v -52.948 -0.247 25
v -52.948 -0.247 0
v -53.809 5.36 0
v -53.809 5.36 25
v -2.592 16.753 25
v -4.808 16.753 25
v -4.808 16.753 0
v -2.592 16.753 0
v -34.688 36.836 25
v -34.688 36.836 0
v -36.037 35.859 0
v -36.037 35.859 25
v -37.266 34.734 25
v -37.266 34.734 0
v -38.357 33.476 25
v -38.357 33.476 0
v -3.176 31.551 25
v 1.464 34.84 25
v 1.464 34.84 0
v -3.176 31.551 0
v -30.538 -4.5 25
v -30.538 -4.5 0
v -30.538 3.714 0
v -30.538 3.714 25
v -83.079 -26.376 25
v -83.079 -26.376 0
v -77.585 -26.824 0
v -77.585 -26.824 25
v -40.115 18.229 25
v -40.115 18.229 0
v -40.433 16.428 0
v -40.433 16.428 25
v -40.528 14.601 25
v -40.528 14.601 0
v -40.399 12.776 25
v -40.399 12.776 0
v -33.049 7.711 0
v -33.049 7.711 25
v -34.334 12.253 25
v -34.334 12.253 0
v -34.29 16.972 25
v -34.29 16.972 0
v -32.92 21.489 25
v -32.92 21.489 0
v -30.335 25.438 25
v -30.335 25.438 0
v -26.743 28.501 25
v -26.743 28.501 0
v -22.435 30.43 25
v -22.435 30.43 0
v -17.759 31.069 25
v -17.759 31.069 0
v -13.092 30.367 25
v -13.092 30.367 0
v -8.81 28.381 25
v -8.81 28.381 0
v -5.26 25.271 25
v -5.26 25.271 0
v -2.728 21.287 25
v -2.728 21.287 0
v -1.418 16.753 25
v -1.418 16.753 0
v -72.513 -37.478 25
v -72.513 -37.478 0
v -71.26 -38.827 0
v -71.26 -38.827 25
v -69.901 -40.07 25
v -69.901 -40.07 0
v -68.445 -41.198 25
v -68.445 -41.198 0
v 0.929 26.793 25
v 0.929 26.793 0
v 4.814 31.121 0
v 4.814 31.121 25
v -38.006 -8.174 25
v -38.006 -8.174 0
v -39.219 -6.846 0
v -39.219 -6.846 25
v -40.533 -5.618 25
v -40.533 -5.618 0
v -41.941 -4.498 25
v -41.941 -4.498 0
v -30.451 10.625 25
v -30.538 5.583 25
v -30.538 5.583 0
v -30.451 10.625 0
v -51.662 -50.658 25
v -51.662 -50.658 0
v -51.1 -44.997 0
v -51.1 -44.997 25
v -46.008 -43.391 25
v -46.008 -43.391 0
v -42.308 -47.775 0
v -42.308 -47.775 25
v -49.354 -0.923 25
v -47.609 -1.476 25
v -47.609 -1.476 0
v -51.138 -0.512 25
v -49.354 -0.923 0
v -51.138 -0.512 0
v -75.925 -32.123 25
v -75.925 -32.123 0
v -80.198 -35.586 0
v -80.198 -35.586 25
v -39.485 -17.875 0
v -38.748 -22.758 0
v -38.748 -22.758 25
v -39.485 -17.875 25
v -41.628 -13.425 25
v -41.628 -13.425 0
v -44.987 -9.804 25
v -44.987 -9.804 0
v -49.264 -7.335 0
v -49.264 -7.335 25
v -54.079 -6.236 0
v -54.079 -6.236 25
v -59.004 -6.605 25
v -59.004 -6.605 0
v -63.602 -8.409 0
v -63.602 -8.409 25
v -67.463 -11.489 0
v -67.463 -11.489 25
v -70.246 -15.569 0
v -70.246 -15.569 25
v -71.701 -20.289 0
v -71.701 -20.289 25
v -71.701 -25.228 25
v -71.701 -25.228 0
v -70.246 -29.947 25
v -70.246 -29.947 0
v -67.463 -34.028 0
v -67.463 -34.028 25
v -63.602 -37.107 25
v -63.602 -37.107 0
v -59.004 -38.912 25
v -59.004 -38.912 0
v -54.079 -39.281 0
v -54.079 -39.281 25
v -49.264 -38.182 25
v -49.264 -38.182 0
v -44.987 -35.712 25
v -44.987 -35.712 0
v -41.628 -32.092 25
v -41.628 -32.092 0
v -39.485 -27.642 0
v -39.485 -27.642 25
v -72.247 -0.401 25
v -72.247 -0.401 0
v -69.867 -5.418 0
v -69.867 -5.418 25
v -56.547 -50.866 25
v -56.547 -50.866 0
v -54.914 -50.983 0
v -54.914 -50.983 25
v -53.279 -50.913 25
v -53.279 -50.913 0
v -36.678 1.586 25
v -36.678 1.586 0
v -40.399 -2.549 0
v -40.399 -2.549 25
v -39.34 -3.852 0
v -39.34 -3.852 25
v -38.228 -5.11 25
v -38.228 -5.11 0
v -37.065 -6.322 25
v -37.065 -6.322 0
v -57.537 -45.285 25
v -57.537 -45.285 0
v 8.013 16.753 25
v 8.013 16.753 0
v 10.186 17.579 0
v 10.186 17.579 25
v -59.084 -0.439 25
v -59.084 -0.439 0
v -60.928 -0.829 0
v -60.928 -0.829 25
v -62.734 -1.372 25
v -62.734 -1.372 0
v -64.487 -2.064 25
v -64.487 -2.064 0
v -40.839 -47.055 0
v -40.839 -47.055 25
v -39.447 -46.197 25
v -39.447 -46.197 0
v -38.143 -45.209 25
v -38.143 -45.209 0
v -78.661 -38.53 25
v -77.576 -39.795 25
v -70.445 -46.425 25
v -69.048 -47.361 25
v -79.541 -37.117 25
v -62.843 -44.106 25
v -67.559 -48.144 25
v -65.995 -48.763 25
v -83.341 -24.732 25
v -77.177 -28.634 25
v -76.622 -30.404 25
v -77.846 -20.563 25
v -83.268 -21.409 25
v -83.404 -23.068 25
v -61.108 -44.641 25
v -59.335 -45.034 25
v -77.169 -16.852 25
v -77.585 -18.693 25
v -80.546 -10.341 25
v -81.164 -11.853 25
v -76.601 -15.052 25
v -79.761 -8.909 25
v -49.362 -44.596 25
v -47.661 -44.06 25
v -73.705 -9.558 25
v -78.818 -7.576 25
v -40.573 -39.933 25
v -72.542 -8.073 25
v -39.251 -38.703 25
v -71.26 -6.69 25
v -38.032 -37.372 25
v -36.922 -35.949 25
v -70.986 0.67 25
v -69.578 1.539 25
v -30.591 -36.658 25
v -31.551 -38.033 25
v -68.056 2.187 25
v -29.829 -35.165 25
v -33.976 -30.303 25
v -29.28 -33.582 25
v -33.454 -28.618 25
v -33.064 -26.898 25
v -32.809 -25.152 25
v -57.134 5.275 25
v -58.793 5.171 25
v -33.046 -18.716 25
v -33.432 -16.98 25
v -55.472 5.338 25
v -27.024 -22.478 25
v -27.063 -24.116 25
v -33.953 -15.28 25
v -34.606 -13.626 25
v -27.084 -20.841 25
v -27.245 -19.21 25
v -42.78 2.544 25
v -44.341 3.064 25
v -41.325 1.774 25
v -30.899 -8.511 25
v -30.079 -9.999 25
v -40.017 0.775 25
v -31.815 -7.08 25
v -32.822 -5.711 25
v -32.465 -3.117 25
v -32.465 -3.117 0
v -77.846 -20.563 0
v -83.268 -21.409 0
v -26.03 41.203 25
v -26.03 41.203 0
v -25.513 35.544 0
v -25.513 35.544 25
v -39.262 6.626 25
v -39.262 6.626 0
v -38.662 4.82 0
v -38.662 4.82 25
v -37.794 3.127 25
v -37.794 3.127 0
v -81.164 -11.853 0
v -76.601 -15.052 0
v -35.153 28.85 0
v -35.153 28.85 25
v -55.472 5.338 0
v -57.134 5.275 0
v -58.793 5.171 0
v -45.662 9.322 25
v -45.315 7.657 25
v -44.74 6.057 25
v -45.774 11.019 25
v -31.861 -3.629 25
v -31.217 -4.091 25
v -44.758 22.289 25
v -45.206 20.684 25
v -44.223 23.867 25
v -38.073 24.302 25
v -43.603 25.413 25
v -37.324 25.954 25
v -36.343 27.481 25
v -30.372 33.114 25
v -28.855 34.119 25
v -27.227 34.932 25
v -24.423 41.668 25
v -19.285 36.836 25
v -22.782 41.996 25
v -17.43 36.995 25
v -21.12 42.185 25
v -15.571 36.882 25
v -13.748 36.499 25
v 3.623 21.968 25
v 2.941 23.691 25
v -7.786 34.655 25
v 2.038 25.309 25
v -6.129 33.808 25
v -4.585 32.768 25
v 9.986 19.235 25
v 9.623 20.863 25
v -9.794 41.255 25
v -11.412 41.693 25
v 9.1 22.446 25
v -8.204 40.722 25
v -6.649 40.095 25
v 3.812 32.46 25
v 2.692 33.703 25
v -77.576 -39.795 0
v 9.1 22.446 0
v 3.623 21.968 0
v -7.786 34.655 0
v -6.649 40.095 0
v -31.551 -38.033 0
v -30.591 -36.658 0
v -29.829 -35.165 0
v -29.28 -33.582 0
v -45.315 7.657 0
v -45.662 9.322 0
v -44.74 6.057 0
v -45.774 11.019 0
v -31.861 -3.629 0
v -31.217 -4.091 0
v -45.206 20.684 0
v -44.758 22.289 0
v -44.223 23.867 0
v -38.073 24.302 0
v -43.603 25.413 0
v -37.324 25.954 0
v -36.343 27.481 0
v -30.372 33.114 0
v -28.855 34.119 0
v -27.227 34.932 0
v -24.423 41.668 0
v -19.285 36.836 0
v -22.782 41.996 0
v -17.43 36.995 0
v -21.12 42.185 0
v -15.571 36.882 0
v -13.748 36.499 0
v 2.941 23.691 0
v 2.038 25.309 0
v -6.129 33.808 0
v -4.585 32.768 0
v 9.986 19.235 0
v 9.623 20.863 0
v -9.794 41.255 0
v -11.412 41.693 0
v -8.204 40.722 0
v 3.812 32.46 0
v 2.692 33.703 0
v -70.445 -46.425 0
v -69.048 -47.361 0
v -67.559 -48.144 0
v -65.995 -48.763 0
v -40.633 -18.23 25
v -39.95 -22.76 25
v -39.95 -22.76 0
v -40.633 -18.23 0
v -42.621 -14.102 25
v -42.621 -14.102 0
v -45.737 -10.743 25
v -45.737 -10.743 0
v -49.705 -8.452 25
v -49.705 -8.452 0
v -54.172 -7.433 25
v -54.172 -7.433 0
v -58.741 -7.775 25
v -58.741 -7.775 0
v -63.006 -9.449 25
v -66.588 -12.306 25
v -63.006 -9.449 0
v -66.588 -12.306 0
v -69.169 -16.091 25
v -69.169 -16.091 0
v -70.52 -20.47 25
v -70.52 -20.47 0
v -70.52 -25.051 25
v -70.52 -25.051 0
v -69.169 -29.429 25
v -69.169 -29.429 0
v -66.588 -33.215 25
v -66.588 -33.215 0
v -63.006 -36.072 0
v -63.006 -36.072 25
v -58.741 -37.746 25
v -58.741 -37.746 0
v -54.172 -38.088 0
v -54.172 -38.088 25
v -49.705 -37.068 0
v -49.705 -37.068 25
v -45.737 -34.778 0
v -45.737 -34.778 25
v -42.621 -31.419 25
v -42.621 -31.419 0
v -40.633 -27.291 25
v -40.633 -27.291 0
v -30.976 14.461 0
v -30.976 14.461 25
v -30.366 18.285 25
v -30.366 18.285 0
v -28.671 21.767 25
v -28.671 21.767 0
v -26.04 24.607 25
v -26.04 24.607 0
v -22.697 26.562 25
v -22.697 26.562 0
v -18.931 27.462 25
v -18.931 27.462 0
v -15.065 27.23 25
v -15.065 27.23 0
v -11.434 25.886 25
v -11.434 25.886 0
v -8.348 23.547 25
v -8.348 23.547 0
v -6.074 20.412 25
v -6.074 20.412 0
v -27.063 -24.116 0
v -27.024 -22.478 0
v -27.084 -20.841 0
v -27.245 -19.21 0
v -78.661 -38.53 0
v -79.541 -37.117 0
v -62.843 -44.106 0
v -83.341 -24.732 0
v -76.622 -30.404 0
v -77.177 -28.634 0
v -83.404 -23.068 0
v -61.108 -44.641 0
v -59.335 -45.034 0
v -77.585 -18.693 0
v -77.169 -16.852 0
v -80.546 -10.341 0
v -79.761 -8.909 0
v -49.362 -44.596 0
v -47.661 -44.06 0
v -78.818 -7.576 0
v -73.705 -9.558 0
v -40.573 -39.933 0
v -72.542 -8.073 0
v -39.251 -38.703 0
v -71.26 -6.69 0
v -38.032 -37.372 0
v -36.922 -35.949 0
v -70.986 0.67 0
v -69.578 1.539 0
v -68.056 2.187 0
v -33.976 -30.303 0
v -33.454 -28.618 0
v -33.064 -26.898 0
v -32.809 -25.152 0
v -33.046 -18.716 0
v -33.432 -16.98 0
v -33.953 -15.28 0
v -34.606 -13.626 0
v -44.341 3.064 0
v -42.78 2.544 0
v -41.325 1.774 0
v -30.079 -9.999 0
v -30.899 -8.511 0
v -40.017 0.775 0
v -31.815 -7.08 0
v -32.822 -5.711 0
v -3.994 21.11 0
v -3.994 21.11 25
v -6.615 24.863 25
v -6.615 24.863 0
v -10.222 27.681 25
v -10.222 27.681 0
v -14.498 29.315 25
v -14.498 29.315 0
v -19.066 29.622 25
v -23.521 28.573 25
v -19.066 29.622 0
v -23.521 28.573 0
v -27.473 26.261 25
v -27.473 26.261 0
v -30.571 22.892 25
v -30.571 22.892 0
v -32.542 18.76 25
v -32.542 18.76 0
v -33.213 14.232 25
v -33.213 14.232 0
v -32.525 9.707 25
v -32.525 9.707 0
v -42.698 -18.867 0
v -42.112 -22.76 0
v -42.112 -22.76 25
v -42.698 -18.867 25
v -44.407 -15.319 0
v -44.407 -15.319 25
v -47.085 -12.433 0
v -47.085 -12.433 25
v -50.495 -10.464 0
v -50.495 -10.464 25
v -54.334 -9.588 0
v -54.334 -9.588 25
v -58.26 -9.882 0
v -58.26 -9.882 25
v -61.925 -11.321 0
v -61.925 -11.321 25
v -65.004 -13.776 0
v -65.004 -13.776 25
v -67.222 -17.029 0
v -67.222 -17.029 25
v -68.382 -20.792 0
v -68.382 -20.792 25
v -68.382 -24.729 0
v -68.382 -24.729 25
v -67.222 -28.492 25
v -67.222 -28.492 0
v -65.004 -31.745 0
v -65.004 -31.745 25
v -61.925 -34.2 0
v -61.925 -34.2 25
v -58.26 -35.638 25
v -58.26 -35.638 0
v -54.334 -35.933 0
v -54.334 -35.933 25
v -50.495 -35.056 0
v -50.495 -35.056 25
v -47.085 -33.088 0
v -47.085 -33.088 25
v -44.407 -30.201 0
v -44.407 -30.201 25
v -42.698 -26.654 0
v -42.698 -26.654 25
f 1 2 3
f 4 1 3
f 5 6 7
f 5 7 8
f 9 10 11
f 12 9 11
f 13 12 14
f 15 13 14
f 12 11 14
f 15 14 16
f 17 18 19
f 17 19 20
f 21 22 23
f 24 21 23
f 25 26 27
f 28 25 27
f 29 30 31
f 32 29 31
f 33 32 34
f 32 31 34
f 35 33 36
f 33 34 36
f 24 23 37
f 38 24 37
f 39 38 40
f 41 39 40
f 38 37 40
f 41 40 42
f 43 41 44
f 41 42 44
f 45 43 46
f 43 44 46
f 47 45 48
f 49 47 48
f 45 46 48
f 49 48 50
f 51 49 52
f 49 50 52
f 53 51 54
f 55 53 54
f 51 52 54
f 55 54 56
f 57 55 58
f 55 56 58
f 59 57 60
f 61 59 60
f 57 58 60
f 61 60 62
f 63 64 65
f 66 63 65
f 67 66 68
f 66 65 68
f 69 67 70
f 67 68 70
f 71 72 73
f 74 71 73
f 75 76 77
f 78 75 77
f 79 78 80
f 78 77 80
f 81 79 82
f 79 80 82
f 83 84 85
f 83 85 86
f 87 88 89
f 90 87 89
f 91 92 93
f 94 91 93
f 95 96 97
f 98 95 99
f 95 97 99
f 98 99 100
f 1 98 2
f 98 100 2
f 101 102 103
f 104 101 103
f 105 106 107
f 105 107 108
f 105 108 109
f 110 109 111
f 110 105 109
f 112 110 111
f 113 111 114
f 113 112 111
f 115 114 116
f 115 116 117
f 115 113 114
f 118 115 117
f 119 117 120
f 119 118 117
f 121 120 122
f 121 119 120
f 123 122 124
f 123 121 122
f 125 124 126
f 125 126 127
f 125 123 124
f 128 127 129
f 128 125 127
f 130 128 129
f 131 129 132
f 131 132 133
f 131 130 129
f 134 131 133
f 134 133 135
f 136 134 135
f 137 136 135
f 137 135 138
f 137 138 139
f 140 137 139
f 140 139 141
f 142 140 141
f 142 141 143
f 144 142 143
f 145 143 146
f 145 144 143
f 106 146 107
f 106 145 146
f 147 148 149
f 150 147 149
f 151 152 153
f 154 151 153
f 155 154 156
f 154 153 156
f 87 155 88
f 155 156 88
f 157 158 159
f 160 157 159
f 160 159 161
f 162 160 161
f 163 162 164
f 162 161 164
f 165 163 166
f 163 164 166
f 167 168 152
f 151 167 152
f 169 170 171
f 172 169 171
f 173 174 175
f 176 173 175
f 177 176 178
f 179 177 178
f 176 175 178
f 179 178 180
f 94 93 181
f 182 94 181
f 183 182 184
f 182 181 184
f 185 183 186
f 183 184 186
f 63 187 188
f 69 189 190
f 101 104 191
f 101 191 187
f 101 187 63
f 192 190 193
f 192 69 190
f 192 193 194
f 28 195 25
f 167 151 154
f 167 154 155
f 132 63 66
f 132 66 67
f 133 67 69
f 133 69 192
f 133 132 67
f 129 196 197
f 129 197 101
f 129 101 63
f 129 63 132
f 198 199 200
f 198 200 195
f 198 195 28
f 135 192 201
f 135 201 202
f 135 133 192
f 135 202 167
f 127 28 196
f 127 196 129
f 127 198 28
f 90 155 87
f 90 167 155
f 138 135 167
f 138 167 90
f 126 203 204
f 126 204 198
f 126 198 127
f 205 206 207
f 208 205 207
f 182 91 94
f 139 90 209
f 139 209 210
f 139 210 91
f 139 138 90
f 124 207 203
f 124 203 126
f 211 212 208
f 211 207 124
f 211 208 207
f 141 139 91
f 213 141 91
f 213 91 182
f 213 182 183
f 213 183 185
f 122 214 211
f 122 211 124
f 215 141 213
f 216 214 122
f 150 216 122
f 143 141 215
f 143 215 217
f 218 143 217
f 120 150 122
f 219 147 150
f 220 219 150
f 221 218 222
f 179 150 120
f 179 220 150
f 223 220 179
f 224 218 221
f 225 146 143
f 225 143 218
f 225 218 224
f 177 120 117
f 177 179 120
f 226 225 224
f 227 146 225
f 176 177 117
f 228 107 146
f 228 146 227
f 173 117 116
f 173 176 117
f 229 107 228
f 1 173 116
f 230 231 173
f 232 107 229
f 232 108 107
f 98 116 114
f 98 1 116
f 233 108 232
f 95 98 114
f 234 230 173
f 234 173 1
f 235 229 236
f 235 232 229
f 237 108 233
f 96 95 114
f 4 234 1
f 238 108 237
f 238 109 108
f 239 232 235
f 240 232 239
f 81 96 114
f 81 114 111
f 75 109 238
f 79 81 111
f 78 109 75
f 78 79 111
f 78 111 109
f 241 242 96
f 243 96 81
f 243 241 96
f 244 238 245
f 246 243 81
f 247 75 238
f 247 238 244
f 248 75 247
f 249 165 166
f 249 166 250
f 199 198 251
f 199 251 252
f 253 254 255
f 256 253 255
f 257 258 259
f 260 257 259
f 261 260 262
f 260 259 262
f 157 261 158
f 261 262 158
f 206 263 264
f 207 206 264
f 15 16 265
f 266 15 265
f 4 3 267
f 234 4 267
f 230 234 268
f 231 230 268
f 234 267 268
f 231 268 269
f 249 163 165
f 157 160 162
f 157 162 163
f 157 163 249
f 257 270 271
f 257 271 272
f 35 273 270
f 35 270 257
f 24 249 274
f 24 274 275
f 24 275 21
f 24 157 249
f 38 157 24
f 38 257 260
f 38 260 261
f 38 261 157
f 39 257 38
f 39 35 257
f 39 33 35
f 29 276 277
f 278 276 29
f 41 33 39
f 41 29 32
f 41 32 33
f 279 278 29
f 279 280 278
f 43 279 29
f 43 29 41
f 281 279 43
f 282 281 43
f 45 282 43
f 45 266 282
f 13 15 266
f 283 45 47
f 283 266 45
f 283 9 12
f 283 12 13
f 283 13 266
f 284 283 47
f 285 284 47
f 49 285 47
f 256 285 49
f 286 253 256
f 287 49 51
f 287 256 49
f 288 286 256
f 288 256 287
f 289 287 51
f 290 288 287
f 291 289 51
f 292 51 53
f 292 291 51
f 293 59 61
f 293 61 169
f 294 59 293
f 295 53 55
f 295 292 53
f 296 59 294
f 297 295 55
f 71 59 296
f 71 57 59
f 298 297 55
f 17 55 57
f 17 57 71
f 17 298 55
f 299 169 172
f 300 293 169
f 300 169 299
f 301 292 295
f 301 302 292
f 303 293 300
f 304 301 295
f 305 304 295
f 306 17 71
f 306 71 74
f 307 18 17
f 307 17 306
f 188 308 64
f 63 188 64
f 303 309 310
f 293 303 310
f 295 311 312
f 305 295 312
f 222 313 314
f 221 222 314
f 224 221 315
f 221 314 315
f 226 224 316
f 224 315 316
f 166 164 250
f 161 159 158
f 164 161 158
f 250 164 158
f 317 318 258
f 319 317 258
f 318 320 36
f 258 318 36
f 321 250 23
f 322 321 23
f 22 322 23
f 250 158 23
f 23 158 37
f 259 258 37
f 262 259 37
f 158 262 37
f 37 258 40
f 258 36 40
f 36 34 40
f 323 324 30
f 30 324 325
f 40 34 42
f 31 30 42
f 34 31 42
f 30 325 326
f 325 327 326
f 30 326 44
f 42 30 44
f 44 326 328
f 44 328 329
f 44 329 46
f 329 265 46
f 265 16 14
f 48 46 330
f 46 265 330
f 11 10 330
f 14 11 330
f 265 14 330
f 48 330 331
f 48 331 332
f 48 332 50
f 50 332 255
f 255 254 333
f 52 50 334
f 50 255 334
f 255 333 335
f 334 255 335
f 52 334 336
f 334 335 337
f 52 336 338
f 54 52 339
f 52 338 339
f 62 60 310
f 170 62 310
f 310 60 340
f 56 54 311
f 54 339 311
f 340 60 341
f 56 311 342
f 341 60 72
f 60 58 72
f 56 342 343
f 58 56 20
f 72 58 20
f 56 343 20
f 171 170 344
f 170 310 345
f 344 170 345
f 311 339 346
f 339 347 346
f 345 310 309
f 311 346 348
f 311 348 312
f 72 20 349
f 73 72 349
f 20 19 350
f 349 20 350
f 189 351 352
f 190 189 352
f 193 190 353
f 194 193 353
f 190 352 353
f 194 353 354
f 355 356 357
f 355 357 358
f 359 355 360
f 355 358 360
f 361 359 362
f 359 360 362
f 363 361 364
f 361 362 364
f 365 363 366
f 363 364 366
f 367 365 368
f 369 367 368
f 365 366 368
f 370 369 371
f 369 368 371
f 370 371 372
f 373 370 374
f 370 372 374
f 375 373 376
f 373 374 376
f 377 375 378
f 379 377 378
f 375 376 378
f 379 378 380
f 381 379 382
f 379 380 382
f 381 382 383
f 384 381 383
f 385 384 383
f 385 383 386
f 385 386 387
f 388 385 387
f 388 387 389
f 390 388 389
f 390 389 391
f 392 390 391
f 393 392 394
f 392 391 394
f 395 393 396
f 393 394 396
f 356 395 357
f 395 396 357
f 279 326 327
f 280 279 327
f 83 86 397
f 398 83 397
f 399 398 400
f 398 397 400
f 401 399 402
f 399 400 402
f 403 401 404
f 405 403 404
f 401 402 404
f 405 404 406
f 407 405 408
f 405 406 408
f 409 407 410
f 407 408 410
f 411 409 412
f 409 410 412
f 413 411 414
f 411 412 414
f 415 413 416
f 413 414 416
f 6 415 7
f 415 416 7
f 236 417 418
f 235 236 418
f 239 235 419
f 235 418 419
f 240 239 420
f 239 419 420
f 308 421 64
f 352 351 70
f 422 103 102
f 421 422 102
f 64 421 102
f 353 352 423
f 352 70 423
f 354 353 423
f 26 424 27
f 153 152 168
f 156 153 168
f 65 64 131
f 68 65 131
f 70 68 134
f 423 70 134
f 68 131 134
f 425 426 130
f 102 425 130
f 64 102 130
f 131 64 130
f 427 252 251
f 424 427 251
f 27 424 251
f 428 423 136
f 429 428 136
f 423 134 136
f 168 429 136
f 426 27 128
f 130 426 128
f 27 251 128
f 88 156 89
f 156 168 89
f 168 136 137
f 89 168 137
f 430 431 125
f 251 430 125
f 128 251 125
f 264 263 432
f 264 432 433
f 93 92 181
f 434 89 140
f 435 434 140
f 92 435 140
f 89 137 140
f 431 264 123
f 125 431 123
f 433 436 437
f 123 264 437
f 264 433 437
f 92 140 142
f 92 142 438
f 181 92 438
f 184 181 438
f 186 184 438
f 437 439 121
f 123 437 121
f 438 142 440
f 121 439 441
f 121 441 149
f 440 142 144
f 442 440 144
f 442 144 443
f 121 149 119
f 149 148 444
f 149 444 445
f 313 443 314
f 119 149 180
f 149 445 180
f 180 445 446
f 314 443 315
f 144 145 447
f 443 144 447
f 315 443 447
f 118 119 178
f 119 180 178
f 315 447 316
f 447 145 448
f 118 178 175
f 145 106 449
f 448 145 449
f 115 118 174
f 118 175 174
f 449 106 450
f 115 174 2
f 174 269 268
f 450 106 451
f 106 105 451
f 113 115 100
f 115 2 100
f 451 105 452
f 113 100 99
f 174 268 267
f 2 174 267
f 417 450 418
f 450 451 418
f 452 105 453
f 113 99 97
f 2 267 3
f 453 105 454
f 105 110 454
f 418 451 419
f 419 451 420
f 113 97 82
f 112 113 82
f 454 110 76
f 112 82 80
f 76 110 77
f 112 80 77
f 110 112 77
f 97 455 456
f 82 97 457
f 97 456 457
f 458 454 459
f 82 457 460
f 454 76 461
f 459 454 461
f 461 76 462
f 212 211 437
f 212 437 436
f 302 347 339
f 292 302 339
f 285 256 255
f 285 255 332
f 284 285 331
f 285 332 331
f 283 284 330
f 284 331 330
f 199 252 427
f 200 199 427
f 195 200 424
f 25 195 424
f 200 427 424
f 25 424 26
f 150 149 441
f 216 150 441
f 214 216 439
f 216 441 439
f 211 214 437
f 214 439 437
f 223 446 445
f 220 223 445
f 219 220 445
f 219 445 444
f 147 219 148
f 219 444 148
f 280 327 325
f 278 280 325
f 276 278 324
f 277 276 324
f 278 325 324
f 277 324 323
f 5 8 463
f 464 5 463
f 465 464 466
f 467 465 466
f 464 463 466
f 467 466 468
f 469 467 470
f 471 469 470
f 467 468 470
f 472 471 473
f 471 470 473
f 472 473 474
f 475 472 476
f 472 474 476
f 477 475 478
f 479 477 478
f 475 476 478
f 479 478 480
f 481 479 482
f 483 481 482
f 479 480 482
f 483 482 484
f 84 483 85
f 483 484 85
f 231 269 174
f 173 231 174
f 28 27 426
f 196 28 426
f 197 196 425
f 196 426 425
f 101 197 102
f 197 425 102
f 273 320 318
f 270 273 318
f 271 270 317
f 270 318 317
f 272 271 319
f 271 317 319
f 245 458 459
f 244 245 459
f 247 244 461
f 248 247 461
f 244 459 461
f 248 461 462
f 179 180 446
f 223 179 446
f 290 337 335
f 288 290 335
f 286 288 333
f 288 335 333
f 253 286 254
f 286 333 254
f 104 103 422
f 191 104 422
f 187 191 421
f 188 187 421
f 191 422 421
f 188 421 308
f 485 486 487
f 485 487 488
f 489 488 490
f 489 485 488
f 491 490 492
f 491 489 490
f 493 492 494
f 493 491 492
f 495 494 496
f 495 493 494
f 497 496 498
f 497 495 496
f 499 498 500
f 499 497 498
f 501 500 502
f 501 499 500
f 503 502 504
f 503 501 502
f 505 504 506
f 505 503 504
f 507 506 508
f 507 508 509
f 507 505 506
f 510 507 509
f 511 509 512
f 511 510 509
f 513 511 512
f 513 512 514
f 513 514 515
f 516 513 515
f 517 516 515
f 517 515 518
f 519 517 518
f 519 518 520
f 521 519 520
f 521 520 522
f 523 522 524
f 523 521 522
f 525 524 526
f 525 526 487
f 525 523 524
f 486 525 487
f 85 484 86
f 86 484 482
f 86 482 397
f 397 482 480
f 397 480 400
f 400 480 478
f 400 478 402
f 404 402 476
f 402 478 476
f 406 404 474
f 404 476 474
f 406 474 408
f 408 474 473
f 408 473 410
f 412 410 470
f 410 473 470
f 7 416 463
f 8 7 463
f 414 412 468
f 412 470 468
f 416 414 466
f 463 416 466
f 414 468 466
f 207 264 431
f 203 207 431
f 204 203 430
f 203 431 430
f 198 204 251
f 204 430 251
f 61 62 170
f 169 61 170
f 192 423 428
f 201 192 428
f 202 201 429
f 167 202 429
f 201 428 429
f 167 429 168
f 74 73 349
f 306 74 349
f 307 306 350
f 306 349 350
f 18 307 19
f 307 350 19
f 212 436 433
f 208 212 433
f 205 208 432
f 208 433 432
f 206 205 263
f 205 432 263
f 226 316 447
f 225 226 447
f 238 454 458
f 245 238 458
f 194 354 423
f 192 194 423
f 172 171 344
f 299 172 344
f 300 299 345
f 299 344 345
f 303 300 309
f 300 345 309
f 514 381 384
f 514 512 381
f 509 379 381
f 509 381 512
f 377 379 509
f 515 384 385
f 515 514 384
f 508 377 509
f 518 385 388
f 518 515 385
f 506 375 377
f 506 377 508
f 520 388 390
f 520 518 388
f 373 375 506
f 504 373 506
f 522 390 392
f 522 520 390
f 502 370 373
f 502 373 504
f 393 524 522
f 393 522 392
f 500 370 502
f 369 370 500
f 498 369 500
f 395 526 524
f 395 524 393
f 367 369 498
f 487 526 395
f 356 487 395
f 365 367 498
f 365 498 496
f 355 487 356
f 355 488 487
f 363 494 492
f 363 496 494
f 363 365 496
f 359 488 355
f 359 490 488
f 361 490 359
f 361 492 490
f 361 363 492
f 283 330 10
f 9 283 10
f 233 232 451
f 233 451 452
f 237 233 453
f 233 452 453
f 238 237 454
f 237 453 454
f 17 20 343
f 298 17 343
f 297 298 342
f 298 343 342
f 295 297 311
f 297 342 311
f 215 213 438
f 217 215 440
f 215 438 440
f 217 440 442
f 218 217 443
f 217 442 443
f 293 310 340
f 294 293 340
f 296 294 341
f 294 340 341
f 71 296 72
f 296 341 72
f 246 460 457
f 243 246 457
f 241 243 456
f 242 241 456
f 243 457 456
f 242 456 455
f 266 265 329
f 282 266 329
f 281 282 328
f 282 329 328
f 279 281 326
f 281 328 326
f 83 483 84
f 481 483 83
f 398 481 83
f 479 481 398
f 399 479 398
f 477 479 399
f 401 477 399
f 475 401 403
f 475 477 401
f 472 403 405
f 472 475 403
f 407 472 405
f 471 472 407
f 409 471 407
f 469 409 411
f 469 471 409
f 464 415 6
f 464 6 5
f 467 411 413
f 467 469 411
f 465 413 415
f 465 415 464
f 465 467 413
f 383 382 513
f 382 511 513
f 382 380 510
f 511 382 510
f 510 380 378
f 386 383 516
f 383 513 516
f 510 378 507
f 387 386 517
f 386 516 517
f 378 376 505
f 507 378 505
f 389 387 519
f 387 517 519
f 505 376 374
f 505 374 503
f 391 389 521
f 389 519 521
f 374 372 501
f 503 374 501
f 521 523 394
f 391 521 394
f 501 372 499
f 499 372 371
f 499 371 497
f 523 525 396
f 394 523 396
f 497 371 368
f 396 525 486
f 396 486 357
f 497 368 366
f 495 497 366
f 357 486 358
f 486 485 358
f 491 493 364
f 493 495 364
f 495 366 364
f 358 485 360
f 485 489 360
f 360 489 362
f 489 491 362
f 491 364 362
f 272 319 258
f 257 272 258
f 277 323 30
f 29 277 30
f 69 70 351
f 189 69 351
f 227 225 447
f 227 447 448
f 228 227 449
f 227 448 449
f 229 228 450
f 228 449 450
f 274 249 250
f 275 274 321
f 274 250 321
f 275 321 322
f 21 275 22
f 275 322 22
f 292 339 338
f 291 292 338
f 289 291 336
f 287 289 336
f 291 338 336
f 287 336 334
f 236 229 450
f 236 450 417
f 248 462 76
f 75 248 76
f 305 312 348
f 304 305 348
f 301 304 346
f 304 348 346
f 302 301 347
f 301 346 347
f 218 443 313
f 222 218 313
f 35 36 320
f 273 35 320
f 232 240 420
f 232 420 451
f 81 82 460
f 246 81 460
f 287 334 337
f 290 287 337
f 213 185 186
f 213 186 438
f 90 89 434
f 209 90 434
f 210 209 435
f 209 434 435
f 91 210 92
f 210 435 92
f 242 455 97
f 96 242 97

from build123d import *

# Parameters (mm, degrees)
F1_R     = 16.569011
F2_R     = 15.370584
F2_R_2   = 13.209188
F3_DEPTH = 25


with BuildPart() as f3:
    # F0 (on Top) + F1 (on Top) + F2 (on Top) → F3 (new body)
    with BuildSketch(Plane.XY):
        with BuildLine():
            Line((-30.537926, 5.583077), (-30.451002, 10.624681))
            ThreePointArc((-30.451002, 10.624681), (-20.846832, 27.150587), (-4.808364, 16.752837))
            Line((-4.808364, 16.752837), (-2.591797, 16.752837))
            ThreePointArc((-2.591797, 16.752837), (-23.521351, 28.572714), (-30.537926, 5.583077))
        make_face()
        with BuildLine():
            Line((-30.537926, -4.500129), (-30.537926, 3.714207))
            ThreePointArc((-30.537926, 3.714207), (-24.658235, 29.619104), (-1.41832, 16.752837))
            Line((-1.41832, 16.752837), (8.012955, 16.752837))
            Line((8.012955, 16.752837), (10.18606, 17.578617))
            ThreePointArc((10.18606, 17.578617), (9.824654, 20.05309), (9.099508, 22.446372))
            Line((9.099508, 22.446372), (3.623283, 21.968288))
            ThreePointArc((3.623283, 21.968288), (2.516429, 24.514752), (0.928633, 26.792582))
            Line((0.928633, 26.792582), (4.814233, 31.120945))
            ThreePointArc((4.814233, 31.120945), (3.266344, 33.094677), (1.464407, 34.839556))
            Line((1.464407, 34.839556), (-3.176177, 31.551197))
            ThreePointArc((-3.176177, 31.551197), (-5.341254, 33.310878), (-7.786029, 34.655165))
            Line((-7.786029, 34.655165), (-6.648932, 40.094789))
            ThreePointArc((-6.648932, 40.094789), (-8.995036, 41.000103), (-11.412445, 41.692872))
            Line((-11.412445, 41.692872), (-13.748104, 36.499105))
            ThreePointArc((-13.748104, 36.499105), (-16.498189, 36.972485), (-19.285366, 36.835745))
            Line((-19.285366, 36.835745), (-21.1202, 42.185187))
            ThreePointArc((-21.1202, 42.185187), (-23.606178, 41.848777), (-26.030317, 41.203167))
            Line((-26.030317, 41.203167), (-25.513461, 35.543609))
            ThreePointArc((-25.513461, 35.543609), (-28.053174, 34.549998), (-30.371893, 33.114396))
            Line((-30.371893, 33.114396), (-34.687627, 36.835745))
            ThreePointArc((-34.687627, 36.835745), (-36.667588, 35.314494), (-38.357291, 33.476193))
            Line((-38.357291, 33.476193), (-35.152793, 28.850343))
            ThreePointArc((-35.152793, 28.850343), (-36.861114, 26.735546), (-38.073018, 24.302026))
            Line((-38.073018, 24.302026), (-43.603361, 25.413262))
            ThreePointArc((-43.603361, 25.413262), (-44.501169, 23.08141), (-45.205608, 20.684045))
            Line((-45.205608, 20.684045), (-40.114593, 18.228985))
            ThreePointArc((-40.114593, 18.228985), (-40.508842, 15.515723), (-40.398866, 12.776174))
            Line((-40.398866, 12.776174), (-45.774151, 11.018869))
            ThreePointArc((-45.774151, 11.018869), (-45.517712, 8.483715), (-44.740446, 6.057067))
            Line((-44.740446, 6.057067), (-39.261788, 6.625607))
            ThreePointArc((-39.261788, 6.625607), (-38.260578, 3.95675), (-36.677517, 1.586277))
            Line((-36.677517, 1.586277), (-40.398866, -2.548558))
            ThreePointArc((-40.398866, -2.548558), (-38.790472, -4.48673), (-37.065156, -6.321595))
            Line((-37.065156, -6.321595), (-32.465152, -3.117098))
            ThreePointArc((-32.465152, -3.117098), (-31.543396, -3.866941), (-30.537926, -4.500129))
        make_face()
    with BuildSketch(Plane.XY):
        with BuildLine():
            Line((-72.246835, -0.400549), (-69.86662, -5.418052))
            ThreePointArc((-69.86662, -5.418052), (-71.915538, -7.367845), (-73.705302, -9.557936))
            Line((-73.705302, -9.557936), (-78.818306, -7.575694))
            ThreePointArc((-78.818306, -7.575694), (-80.174223, -9.614053), (-81.164025, -11.853185))
            Line((-81.164025, -11.853185), (-76.600832, -15.052426))
            ThreePointArc((-76.600832, -15.052426), (-77.396078, -17.768601), (-77.846158, -20.562783))
            Line((-77.846158, -20.562783), (-83.26827, -21.408547))
            ThreePointArc((-83.26827, -21.408547), (-83.397601, -23.900813), (-83.078548, -26.375955))
            Line((-83.078548, -26.375955), (-77.584769, -26.823953))
            ThreePointArc((-77.584769, -26.823953), (-76.917881, -29.52472), (-75.924733, -32.123285))
            Line((-75.924733, -32.123285), (-80.198139, -35.586357))
            ThreePointArc((-80.198139, -35.586357), (-79.127714, -37.840377), (-77.576451, -39.794859))
            Line((-77.576451, -39.794859), (-72.513014, -37.478207))
            ThreePointArc((-72.513014, -37.478207), (-70.592804, -39.462389), (-68.445291, -41.198008))
            Line((-68.445291, -41.198008), (-70.445001, -46.424884))
            ThreePointArc((-70.445001, -46.424884), (-68.314011, -47.772427), (-65.995231, -48.762504))
            Line((-65.995231, -48.762504), (-62.84346, -44.105949))
            ThreePointArc((-62.84346, -44.105949), (-60.225671, -44.855183), (-57.536856, -45.284664))
            Line((-57.536856, -45.284664), (-56.547172, -50.865881))
            ThreePointArc((-56.547172, -50.865881), (-54.095735, -50.971555), (-51.662136, -50.65801))
            Line((-51.662136, -50.65801), (-51.099671, -44.997298))
            ThreePointArc((-51.099671, -44.997298), (-48.506302, -44.344659), (-46.008002, -43.390719))
            Line((-46.008002, -43.390719), (-42.308107, -47.775354))
            ThreePointArc((-42.308107, -47.775354), (-40.132632, -46.643046), (-38.14302, -45.20908))
            Line((-38.14302, -45.20908), (-40.572969, -39.932777))
            ThreePointArc((-40.572969, -39.932777), (-38.628357, -38.050013), (-36.922384, -35.948591))
            Line((-36.922384, -35.948591), (-31.550601, -38.03277))
            ThreePointArc((-31.550601, -38.03277), (-30.184674, -35.924708), (-29.279564, -33.581536))
            Line((-29.279564, -33.581536), (-33.976404, -30.302956))
            ThreePointArc((-33.976404, -30.302956), (-33.241946, -27.761713), (-32.808973, -25.152139))
            Line((-32.808973, -25.152139), (-27.063029, -24.115844))
            ThreePointArc((-27.063029, -24.115844), (-27.041564, -21.658962), (-27.244711, -19.2104))
            Line((-27.244711, -19.2104), (-33.045982, -18.715576))
            ThreePointArc((-33.045982, -18.715576), (-33.675809, -16.124957), (-34.60587, -13.626361))
            Line((-34.60587, -13.626361), (-30.07897, -9.999067))
            ThreePointArc((-30.07897, -9.999067), (-31.345091, -7.787648), (-32.822385, -5.711345))
            Line((-32.822385, -5.711345), (-38.006458, -8.174356))
            ThreePointArc((-38.006458, -8.174356), (-39.864077, -6.218797), (-41.941117, -4.498081))
            Line((-41.941117, -4.498081), (-40.017035, 0.774743))
            ThreePointArc((-40.017035, 0.774743), (-42.036435, 2.18876), (-44.341095, 3.06395))
            Line((-44.341095, 3.06395), (-47.60949, -1.475693))
            ThreePointArc((-47.60949, -1.475693), (-50.241615, -0.699335), (-52.948346, -0.247204))
            Line((-52.948346, -0.247204), (-53.808771, 5.360264))
            ThreePointArc((-53.808771, 5.360264), (-56.30287, 5.311936), (-58.793426, 5.170537))
            Line((-58.793426, 5.170537), (-59.084319, -0.438512))
            ThreePointArc((-59.084319, -0.438512), (-61.836721, -1.082013), (-64.487461, -2.063535))
            Line((-64.487461, -2.063535), (-68.055578, 2.186643))
            ThreePointArc((-68.055578, 2.186643), (-70.298082, 1.130986), (-72.246835, -0.400549))
        make_face()
        with Locations((-55.317461, -22.758307)):
            Circle(F1_R, mode=Mode.SUBTRACT)
    with BuildSketch(Plane.XY):
        with Locations((-55.32084, -22.760384)):
            Circle(F2_R)
        with Locations((-55.32084, -22.760384)):
            Circle(F2_R_2, mode=Mode.SUBTRACT)
    extrude(amount=F3_DEPTH)


solid = f3.part
